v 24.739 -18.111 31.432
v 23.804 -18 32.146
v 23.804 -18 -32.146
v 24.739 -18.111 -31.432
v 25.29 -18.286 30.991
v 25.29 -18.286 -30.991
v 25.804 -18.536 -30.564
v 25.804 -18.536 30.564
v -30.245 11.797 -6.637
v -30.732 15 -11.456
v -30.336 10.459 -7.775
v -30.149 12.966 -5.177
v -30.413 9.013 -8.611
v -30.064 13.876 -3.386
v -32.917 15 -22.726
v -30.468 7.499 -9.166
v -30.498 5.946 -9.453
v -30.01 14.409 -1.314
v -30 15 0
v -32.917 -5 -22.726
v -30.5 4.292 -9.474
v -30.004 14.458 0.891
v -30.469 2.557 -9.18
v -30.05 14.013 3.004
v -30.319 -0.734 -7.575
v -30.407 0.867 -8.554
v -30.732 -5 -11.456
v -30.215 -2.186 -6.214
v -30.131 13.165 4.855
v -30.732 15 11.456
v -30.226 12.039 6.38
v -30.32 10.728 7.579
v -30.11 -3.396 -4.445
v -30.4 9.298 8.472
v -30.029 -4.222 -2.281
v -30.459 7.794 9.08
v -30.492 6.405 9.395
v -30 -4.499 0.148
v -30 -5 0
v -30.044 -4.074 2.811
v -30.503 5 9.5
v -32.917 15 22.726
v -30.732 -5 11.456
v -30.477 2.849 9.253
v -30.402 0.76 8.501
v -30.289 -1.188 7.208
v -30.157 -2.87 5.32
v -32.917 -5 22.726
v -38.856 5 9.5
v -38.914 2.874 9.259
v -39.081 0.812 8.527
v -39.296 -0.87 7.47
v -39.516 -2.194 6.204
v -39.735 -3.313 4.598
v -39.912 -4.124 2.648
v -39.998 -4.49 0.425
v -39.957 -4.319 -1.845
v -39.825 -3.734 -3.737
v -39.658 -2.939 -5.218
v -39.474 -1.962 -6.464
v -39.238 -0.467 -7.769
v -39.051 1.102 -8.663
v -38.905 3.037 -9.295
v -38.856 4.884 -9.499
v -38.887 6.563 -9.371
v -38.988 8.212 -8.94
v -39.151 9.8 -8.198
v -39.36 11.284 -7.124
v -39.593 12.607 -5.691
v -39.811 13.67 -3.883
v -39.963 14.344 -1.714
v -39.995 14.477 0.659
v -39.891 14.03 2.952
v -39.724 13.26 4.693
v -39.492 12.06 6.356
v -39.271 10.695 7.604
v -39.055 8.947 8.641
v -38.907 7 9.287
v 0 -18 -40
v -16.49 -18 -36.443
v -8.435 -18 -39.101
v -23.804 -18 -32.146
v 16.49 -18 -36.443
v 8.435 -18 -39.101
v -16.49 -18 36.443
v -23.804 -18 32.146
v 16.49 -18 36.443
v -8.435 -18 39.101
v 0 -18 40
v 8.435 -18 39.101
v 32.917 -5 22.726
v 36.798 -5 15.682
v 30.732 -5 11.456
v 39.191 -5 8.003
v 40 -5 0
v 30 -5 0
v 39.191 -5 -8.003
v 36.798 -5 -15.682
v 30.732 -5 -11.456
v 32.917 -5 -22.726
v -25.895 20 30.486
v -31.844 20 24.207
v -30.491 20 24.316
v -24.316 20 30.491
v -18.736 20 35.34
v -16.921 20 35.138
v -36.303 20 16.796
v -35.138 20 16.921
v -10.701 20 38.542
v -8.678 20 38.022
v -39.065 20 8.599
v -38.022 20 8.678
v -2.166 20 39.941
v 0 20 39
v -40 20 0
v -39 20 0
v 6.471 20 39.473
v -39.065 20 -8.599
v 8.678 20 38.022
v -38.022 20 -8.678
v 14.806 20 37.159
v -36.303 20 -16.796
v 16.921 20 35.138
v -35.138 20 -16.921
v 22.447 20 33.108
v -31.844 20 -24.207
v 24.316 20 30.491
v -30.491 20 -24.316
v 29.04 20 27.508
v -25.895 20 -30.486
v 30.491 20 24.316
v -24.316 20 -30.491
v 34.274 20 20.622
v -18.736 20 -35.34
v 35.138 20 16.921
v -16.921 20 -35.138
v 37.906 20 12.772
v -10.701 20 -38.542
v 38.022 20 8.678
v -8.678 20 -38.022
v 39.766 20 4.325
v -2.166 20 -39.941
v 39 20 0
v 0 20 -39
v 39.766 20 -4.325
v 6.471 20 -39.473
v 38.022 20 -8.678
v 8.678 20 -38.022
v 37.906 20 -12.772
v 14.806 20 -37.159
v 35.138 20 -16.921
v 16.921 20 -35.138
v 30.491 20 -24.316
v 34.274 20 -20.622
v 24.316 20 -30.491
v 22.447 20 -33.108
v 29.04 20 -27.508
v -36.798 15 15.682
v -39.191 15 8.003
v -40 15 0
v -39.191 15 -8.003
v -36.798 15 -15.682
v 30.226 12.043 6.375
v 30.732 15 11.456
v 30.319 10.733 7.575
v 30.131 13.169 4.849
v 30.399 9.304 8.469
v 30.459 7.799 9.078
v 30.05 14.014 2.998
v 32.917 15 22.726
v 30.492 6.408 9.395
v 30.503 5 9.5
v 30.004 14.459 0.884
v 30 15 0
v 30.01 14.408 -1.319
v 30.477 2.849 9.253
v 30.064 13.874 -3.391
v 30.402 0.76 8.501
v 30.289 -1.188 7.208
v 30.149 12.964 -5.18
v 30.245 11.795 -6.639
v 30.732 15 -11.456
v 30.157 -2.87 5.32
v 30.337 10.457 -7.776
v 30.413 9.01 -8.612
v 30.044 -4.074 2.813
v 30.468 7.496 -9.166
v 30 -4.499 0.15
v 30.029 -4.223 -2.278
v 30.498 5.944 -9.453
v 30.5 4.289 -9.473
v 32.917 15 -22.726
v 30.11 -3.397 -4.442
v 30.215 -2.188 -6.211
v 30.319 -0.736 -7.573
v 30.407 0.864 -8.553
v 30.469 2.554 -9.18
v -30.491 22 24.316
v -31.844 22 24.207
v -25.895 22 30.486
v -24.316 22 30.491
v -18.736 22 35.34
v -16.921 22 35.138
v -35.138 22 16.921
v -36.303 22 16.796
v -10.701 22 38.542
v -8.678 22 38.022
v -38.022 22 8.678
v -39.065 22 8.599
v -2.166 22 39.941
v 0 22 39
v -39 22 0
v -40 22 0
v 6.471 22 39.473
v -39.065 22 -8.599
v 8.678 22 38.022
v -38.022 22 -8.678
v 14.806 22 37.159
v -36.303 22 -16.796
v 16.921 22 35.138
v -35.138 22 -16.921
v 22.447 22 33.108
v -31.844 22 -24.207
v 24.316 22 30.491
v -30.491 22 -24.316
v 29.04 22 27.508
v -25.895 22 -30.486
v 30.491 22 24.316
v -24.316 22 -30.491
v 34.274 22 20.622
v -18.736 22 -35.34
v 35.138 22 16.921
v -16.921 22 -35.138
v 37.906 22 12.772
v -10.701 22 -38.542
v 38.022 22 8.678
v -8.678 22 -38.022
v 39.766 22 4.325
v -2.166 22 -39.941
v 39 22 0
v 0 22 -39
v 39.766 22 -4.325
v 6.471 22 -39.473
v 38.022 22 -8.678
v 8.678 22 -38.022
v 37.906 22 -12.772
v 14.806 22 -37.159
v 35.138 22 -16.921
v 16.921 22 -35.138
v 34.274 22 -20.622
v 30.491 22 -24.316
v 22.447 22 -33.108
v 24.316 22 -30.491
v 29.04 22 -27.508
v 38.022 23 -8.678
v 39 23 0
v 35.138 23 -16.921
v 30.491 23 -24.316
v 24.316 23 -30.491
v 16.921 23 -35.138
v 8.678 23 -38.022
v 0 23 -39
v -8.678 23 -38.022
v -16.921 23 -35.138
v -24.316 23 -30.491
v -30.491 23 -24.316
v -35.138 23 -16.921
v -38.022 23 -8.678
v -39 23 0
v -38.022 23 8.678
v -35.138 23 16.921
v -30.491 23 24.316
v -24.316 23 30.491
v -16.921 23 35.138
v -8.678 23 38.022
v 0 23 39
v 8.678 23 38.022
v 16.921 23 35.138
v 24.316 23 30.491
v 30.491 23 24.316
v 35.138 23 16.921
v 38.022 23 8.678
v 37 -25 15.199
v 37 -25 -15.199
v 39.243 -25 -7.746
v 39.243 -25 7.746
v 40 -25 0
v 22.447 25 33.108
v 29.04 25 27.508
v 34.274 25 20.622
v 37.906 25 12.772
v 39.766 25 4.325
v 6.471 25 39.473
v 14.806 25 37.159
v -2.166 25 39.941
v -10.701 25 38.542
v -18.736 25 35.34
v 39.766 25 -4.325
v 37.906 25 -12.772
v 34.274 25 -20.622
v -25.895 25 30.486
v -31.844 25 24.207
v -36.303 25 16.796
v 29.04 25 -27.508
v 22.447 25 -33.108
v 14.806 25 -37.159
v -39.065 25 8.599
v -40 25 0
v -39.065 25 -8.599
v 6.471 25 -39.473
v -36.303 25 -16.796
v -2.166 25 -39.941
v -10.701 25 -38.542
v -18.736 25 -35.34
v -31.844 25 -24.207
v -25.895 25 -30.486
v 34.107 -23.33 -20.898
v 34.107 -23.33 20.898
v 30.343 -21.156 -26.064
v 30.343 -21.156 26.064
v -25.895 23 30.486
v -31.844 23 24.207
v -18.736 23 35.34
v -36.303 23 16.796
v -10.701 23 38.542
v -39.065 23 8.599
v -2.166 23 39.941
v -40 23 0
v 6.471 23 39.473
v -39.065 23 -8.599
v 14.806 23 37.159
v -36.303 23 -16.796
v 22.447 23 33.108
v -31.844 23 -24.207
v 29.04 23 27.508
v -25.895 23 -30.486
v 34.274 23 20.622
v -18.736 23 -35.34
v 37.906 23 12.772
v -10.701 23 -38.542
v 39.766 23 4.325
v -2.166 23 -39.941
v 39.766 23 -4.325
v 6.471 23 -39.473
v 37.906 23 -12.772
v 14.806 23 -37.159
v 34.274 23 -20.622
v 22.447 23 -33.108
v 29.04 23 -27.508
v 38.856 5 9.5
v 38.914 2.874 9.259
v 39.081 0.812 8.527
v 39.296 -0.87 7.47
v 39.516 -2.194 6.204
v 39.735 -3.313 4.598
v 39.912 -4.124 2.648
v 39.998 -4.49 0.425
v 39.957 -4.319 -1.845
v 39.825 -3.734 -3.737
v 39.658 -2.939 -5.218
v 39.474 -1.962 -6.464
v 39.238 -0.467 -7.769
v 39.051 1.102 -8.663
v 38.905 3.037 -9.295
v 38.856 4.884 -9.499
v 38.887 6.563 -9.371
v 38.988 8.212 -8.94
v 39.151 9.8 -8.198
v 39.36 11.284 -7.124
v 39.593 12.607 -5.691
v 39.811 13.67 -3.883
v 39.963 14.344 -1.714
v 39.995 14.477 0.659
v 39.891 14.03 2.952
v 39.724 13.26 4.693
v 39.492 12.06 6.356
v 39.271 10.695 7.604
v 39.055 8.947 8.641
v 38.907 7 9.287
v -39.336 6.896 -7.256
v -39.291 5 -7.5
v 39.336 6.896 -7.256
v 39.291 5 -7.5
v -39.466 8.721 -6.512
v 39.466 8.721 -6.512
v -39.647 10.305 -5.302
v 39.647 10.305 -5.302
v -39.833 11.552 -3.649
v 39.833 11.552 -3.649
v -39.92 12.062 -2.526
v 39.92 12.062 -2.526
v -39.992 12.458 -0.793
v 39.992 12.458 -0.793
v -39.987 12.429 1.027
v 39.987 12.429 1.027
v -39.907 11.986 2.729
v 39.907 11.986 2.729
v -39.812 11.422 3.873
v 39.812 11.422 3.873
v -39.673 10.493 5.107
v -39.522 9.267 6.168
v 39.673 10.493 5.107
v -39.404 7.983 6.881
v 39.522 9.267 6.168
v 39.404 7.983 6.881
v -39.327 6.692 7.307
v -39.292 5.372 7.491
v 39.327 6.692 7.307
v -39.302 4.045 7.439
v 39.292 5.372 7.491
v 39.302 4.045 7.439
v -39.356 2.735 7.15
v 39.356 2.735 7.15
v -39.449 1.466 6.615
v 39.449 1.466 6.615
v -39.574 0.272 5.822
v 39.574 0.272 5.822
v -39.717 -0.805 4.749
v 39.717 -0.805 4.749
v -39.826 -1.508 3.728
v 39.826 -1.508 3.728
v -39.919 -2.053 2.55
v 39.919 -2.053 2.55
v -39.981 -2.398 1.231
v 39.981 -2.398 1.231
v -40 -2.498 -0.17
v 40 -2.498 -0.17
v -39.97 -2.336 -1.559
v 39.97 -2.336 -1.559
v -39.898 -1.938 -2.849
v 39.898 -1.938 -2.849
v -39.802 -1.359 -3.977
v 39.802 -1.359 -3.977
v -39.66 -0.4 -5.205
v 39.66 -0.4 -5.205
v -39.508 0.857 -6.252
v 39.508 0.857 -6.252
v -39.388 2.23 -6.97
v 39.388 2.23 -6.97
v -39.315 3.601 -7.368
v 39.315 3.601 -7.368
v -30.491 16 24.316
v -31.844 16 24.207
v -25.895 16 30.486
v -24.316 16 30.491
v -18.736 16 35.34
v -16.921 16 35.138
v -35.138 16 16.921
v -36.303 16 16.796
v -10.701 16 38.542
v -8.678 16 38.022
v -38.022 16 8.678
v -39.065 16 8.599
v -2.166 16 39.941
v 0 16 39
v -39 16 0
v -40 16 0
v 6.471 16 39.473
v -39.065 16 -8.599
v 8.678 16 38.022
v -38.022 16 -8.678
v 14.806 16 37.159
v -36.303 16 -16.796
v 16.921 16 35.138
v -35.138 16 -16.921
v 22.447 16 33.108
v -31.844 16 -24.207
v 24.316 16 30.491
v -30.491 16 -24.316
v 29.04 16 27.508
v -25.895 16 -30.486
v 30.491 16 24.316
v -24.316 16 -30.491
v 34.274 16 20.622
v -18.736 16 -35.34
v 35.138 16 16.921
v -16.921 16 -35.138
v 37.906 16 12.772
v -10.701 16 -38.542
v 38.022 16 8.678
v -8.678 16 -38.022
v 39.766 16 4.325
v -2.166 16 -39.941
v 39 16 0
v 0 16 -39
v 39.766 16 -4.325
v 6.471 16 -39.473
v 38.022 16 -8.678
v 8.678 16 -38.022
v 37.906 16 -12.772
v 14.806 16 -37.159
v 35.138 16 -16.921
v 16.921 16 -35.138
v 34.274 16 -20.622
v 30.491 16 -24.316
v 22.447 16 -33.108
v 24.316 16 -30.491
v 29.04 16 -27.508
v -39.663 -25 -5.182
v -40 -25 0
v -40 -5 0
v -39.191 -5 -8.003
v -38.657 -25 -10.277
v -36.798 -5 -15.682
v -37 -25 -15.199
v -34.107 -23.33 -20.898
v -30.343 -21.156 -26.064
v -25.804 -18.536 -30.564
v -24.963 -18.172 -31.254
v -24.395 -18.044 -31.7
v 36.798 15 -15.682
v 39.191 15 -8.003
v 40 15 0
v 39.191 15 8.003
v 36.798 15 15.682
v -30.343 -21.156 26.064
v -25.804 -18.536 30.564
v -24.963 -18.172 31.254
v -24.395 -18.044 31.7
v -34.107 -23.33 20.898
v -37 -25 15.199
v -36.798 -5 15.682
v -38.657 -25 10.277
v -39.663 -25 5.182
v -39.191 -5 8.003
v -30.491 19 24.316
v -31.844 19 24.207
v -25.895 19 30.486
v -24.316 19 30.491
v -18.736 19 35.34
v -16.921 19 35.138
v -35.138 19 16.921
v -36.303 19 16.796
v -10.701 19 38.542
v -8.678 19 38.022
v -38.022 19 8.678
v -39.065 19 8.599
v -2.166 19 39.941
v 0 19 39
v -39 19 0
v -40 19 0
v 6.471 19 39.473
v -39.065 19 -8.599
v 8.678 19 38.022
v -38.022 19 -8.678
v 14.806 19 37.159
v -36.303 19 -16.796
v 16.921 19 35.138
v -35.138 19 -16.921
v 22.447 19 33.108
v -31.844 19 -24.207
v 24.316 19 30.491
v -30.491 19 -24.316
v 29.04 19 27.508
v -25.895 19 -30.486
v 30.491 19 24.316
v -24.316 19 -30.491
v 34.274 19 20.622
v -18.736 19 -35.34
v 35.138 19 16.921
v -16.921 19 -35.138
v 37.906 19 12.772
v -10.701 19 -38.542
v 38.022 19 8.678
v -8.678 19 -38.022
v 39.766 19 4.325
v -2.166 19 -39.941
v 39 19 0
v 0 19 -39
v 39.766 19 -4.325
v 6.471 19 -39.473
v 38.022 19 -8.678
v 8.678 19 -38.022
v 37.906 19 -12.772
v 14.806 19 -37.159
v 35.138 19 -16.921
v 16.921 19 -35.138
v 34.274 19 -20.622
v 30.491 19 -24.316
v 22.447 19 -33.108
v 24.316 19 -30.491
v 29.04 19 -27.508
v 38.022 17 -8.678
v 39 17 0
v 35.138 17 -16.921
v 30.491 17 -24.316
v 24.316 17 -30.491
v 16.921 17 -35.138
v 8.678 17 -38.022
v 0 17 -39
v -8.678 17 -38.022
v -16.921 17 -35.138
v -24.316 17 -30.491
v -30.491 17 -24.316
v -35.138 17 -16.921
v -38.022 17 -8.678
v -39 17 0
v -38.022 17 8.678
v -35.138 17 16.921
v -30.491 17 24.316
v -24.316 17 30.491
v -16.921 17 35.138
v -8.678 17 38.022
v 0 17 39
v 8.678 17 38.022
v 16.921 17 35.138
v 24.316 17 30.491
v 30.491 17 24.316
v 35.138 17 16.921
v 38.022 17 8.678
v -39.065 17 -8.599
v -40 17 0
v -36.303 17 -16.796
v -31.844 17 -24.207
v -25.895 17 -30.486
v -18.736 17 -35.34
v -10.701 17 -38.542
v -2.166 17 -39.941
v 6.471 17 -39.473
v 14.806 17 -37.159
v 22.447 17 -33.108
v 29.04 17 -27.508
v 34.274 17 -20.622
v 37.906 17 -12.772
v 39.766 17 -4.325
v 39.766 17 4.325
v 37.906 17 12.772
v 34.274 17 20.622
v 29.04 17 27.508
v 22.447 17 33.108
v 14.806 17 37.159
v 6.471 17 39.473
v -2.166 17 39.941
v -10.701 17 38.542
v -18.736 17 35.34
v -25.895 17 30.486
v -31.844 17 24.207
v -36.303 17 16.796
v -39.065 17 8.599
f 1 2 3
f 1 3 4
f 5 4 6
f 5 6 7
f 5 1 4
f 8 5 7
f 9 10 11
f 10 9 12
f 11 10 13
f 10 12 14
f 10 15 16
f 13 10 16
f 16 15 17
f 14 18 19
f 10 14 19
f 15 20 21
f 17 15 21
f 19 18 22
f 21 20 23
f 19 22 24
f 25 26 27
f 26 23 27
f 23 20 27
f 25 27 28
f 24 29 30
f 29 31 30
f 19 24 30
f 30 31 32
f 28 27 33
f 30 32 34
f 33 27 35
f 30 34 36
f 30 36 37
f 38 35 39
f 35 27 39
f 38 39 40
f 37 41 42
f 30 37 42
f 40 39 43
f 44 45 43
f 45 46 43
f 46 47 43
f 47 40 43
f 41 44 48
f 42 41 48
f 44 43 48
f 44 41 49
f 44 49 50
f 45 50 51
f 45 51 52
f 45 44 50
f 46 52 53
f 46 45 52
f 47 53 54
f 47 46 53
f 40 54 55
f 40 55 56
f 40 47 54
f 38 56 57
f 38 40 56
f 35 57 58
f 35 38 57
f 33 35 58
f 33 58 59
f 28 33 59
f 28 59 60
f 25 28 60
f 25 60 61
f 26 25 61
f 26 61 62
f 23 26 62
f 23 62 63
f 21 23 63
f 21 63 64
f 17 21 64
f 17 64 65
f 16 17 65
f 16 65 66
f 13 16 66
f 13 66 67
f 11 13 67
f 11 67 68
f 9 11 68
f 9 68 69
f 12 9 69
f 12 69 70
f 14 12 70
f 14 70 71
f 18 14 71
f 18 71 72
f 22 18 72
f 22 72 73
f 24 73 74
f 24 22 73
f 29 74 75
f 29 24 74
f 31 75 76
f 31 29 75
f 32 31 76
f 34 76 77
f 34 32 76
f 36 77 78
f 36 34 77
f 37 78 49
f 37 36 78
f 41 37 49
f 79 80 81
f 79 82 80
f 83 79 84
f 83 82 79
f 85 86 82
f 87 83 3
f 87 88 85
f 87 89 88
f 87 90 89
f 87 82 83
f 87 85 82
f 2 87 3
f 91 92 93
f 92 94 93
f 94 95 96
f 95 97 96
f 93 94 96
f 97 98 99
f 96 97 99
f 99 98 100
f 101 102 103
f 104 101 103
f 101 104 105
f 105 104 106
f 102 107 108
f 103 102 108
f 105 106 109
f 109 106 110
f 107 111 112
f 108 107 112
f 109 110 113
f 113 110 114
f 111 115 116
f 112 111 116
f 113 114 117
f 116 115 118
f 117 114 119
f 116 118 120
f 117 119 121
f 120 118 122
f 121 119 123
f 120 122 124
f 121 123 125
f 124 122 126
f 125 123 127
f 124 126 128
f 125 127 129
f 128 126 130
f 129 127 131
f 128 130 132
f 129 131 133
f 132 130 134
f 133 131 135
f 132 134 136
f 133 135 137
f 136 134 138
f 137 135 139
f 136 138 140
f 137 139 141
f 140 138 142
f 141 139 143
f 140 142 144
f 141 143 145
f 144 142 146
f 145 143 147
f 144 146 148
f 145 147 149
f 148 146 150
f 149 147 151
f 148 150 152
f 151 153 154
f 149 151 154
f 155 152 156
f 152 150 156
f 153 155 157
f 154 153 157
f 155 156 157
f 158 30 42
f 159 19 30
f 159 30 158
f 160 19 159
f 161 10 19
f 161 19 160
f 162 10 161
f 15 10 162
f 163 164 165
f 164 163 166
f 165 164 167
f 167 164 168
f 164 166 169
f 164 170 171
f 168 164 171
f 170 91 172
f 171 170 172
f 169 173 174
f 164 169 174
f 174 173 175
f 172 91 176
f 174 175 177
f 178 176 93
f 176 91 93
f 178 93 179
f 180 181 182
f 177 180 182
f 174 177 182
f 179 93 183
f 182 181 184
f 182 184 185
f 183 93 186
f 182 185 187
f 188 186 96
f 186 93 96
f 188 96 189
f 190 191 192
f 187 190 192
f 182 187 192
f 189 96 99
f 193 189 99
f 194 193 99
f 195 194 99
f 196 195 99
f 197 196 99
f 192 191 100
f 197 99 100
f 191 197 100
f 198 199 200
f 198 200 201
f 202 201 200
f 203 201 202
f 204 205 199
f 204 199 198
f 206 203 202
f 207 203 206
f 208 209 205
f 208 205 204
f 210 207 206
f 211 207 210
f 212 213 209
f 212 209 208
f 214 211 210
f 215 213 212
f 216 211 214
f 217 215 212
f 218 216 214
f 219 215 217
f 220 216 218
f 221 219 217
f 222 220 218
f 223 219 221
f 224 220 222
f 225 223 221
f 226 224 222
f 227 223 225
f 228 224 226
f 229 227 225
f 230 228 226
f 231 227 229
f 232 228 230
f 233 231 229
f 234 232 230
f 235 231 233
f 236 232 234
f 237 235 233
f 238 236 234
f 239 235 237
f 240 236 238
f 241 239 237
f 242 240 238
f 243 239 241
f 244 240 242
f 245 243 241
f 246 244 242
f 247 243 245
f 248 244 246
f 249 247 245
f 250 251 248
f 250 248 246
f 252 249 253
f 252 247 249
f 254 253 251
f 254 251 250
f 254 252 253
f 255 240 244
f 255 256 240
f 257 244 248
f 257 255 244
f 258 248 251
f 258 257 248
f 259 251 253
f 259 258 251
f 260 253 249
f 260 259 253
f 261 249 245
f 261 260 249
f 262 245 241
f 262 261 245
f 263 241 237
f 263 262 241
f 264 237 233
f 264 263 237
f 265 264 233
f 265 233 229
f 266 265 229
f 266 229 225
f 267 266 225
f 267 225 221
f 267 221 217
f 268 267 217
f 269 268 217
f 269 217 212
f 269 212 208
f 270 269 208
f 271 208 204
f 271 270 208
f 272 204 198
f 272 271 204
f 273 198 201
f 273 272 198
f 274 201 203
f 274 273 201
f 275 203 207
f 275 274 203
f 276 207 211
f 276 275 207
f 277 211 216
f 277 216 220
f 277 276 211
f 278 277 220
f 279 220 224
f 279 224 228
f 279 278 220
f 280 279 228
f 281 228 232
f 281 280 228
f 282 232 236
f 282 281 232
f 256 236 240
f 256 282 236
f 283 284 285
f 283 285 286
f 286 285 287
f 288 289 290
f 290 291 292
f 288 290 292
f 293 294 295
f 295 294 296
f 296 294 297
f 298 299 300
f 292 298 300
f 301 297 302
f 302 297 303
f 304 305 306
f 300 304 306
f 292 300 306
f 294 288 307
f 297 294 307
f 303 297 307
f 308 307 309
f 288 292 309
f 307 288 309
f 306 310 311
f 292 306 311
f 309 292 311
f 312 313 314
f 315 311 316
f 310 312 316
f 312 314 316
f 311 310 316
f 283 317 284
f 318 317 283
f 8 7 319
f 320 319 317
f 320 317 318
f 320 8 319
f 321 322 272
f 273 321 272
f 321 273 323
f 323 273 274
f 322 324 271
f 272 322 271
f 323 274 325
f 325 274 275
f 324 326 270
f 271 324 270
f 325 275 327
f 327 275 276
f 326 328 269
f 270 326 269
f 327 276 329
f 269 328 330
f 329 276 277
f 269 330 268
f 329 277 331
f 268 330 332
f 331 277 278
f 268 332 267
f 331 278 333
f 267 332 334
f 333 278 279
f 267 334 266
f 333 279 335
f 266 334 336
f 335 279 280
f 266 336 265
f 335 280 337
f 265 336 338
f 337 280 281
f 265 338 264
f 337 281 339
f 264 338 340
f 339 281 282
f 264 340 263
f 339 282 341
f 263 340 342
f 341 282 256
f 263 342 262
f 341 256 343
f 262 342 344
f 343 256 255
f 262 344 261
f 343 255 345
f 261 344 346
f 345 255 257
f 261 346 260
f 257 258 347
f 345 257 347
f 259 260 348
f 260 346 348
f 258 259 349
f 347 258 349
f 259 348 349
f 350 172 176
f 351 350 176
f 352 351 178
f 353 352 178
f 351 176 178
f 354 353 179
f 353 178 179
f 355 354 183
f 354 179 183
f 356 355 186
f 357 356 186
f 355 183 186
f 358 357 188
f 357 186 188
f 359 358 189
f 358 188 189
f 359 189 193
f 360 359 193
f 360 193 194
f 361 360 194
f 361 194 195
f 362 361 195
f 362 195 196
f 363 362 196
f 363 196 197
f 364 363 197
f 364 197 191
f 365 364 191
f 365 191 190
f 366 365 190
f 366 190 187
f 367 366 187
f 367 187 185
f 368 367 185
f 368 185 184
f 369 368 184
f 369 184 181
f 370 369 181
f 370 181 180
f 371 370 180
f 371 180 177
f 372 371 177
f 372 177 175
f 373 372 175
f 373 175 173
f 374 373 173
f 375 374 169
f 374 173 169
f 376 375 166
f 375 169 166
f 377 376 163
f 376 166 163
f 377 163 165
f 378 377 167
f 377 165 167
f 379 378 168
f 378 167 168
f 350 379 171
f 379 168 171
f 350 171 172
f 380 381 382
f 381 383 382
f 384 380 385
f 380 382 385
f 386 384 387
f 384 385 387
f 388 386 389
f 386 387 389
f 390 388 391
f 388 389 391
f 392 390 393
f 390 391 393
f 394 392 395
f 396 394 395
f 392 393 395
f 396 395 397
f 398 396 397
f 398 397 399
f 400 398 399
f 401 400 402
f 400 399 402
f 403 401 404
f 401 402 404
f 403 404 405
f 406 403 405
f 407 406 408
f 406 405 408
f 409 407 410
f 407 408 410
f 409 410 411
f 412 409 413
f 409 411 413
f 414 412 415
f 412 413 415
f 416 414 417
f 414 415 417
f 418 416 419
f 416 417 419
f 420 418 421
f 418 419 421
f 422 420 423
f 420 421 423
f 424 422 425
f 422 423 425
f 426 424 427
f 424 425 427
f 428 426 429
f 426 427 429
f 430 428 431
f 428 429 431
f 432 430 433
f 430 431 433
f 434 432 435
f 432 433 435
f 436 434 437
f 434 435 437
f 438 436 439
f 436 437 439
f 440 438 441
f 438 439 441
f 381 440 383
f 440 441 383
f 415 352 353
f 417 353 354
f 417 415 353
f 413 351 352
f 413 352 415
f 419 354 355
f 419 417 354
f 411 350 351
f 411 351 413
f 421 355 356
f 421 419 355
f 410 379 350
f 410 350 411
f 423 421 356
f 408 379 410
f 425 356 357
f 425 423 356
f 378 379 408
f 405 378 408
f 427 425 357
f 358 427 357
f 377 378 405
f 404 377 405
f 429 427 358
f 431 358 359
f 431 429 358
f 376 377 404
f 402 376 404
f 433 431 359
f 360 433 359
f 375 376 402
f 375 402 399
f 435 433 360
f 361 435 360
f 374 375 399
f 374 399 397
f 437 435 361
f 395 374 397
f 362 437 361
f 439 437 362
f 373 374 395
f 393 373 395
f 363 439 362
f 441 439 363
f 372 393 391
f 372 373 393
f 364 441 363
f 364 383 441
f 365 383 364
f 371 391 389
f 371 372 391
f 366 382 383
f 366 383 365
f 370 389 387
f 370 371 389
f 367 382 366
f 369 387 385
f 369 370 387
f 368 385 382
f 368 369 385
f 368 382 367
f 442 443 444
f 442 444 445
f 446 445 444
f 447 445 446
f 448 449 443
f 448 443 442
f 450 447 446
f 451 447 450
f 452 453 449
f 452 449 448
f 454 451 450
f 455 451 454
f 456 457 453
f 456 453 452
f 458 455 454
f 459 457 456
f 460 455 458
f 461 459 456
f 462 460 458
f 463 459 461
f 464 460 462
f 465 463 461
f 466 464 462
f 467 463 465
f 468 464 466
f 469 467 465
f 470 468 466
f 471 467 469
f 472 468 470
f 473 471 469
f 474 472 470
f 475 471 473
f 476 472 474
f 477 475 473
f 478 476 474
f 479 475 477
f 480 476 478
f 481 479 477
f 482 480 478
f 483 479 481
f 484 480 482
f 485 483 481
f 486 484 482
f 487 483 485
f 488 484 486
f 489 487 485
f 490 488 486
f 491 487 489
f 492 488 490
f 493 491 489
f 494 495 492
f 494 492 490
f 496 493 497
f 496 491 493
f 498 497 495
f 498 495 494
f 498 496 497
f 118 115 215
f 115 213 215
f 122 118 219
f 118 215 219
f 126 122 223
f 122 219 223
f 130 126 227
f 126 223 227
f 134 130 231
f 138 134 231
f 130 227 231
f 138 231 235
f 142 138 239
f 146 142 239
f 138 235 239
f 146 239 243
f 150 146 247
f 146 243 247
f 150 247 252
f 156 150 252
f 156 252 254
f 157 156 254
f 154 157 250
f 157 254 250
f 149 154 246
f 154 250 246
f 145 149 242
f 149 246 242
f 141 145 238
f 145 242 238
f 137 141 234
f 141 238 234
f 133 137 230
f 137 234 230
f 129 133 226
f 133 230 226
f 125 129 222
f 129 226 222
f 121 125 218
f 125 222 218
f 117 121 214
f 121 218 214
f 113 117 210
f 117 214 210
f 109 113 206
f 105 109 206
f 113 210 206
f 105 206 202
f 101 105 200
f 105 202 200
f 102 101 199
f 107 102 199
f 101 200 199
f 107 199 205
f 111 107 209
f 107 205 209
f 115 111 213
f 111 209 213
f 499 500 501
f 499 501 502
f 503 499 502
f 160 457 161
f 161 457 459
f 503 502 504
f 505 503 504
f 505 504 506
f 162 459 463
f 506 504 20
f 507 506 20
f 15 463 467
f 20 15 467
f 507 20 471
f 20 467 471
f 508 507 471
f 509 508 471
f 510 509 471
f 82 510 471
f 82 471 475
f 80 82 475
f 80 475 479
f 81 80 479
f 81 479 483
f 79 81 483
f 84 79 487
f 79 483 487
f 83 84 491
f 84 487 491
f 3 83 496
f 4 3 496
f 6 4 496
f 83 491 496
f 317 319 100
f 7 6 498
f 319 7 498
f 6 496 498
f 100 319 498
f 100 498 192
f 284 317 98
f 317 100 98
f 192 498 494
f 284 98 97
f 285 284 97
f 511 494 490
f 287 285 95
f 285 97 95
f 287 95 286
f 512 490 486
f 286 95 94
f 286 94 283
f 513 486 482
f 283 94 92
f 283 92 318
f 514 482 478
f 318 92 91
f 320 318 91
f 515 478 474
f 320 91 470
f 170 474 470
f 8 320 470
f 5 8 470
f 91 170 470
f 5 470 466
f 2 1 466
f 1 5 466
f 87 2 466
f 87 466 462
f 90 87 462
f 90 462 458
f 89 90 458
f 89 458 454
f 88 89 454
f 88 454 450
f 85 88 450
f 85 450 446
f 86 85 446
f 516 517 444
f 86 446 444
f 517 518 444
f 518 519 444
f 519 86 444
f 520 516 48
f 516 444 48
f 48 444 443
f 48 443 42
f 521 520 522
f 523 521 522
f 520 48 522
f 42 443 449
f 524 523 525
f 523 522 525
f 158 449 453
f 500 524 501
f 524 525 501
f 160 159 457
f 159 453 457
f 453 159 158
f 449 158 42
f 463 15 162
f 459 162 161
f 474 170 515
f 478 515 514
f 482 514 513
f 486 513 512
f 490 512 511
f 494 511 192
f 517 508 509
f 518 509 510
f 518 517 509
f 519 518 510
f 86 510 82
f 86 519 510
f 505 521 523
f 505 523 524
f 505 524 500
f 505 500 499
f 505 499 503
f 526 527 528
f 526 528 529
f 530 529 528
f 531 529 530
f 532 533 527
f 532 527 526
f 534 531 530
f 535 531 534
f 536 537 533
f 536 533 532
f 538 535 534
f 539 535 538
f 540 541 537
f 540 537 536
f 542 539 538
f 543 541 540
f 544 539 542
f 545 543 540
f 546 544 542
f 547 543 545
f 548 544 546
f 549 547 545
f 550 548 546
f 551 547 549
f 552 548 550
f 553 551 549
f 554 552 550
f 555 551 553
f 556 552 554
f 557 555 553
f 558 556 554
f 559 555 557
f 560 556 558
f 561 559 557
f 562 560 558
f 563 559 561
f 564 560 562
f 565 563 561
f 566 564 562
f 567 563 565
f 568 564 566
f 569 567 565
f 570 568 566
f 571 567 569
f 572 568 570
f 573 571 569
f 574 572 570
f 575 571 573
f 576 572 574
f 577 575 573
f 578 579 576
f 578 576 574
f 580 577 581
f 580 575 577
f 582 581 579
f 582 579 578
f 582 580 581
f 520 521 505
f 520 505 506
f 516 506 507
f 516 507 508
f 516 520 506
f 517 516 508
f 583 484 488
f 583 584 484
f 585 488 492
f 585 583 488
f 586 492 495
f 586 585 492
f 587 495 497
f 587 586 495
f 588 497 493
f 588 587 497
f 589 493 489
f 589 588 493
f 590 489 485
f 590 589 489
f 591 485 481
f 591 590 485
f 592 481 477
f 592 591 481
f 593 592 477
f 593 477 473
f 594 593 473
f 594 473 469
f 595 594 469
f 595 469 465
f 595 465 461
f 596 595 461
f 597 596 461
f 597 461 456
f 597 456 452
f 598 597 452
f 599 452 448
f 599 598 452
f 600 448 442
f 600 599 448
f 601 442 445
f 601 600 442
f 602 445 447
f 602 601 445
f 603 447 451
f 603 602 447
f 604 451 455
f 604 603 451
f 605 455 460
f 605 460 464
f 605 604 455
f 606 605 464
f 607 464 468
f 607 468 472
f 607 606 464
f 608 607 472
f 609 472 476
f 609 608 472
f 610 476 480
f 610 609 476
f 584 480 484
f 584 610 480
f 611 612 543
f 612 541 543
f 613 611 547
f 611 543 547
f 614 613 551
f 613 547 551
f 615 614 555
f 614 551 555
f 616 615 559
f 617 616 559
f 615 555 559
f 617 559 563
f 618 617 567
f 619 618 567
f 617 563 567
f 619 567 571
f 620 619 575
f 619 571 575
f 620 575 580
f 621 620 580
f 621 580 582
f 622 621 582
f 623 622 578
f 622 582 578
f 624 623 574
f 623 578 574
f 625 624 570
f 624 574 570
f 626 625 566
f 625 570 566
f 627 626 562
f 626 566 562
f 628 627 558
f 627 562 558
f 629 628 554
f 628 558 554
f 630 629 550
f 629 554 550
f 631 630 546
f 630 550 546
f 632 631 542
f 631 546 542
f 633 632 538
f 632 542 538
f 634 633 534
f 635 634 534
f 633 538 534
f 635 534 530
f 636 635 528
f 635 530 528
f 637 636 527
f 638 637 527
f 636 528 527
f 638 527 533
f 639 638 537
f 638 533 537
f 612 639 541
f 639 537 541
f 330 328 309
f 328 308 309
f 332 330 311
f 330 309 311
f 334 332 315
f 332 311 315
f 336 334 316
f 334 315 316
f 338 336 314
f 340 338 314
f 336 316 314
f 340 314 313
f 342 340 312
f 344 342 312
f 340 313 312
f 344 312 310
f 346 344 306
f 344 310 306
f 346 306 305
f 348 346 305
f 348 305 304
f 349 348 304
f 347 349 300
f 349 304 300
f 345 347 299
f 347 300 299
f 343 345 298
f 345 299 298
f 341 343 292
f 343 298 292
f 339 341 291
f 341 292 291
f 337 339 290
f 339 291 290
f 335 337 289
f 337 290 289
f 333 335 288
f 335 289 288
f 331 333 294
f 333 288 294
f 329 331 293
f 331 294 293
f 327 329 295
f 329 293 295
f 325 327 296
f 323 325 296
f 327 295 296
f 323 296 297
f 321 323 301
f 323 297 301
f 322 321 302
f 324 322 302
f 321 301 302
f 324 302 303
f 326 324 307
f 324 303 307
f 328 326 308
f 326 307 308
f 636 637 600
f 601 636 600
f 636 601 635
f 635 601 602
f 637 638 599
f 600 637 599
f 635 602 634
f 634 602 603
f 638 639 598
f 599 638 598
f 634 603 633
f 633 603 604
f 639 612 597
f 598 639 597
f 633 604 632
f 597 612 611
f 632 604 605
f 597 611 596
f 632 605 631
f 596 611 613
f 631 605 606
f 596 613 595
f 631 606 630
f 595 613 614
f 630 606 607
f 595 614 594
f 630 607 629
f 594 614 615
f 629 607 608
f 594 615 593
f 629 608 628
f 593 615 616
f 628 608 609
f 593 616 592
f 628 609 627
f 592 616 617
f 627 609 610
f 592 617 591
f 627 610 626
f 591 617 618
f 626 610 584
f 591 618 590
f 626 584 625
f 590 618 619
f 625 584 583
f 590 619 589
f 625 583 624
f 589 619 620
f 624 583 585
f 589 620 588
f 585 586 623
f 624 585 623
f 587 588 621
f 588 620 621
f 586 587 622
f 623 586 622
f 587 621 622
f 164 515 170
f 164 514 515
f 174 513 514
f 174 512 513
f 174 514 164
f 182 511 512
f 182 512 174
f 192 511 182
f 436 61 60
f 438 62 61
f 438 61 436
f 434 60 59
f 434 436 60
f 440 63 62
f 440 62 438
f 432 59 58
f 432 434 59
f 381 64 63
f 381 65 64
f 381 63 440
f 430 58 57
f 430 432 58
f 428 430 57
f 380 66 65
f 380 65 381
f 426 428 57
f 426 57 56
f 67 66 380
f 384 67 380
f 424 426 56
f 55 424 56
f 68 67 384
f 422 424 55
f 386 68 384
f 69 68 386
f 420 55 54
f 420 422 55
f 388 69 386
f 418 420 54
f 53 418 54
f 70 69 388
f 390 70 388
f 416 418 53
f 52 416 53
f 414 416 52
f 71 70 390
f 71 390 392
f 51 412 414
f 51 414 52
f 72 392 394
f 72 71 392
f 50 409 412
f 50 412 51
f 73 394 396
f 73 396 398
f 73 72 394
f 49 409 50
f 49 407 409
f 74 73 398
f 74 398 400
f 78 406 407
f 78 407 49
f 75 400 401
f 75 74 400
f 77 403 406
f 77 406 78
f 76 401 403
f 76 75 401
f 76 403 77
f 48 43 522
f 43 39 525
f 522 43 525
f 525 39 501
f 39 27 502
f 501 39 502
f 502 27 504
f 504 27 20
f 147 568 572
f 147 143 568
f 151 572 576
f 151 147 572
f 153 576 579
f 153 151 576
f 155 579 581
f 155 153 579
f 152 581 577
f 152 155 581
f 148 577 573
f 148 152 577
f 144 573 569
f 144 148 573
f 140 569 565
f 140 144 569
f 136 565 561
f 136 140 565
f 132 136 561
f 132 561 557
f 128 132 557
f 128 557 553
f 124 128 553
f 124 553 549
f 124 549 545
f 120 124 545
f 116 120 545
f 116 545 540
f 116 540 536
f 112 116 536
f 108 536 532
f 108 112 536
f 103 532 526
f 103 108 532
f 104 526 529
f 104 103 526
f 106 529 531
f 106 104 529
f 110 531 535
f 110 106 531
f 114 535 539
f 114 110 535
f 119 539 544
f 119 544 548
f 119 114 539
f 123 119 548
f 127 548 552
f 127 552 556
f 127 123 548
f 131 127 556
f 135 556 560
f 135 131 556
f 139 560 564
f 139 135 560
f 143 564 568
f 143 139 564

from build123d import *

# Parameters (mm, degrees)
SKETCH1_W                            = 40
SKETCH1_H                            = 50
CUT_EXTRUDE1_DEPTH                   = 55
SKETCH3_R                            = 90
CUT_EXTRUDE4_DEPTH                   = 20
BOSS_EXTRUDE1_REACH                  = 63.847
BOSS_EXTRUDE1_END_RADIUS             = 40
SKETCH4_R                            = 9.5
BOSS_EXTRUDE1_DIRECTION_2_REACH      = 63.847
BOSS_EXTRUDE1_DIRECTION_2_END_RADIUS = 40
SKETCH5_R                            = 7.5
CUT_EXTRUDE5_DEPTH                   = 55
SKETCH6_W                            = 1
SKETCH6_H                            = 1


with BuildPart() as part:
    # Sketch1 → Revolve1 (revolve)
    with BuildSketch(Plane.XY):
        with Locations((-20, 0)):
            Rectangle(SKETCH1_W, SKETCH1_H)
    revolve(axis=Axis((0, 25, 0), (0, -1, 0)))

    # Sketch2 → Cut-Extrude1 (cut, symmetric)
    with BuildSketch(Plane.XY):
        with BuildLine():
            Line((-37, -25), (-25.803847577, -18.535898385))
            ThreePointArc((-25.803847577, -18.535898385), (-24.839123758, -18.136296695), (-23.803847577, -18))
            Line((-23.803847577, -18), (23.803847577, -18))
            ThreePointArc((23.803847577, -18), (24.839123758, -18.136296695), (25.803847577, -18.535898385))
            Line((25.803847577, -18.535898385), (37, -25))
            Line((37, -25), (-37, -25))
        make_face()
    extrude(amount=CUT_EXTRUDE1_DEPTH, both=True, mode=Mode.SUBTRACT)

    # Sketch3 → Cut-Extrude4 (cut)
    with BuildSketch(Plane(origin=(0, -5, 0), x_dir=(-1, 0, 0), z_dir=(0, -1, 0))):
        with Locations((-120, 0)):
            Circle(SKETCH3_R)
        with Locations((120, 0)):
            Circle(SKETCH3_R)
    extrude(amount=-CUT_EXTRUDE4_DEPTH, mode=Mode.SUBTRACT)

    # Boss-Extrude1: up to this cylinder (the profile starts inside it)
    boss_extrude1_end = Plane(origin=(0, 5, 0), z_dir=(0, 1, 0)) * Cylinder(BOSS_EXTRUDE1_END_RADIUS, 208.694, mode=Mode.PRIVATE)
    # Sketch4 → Boss-Extrude1 (add, up to the surface)
    with BuildSketch(Plane(origin=(0, 0, 0), x_dir=(0, 0, -1), z_dir=(1, 0, 0)), mode=Mode.PRIVATE) as boss_extrude1_sk1:
        with Locations(Location((0, 5, 0), (0, 0, 180))):
            Circle(SKETCH4_R)
    boss_extrude1_tool1 = extrude(boss_extrude1_sk1.sketch, amount=BOSS_EXTRUDE1_REACH, mode=Mode.PRIVATE) & boss_extrude1_end
    add(boss_extrude1_tool1.solids().sort_by_distance((0, 5, 0))[0])

    # Boss-Extrude1 direction 2: up to this cylinder (the profile starts inside it)
    boss_extrude1_direction_2_end = Plane(origin=(0, 5, 0), z_dir=(0, 1, 0)) * Cylinder(BOSS_EXTRUDE1_DIRECTION_2_END_RADIUS, 208.694, mode=Mode.PRIVATE)
    # Sketch4 → Boss-Extrude1 direction 2 (add, up to the surface)
    with BuildSketch(Plane(origin=(0, 0, 0), x_dir=(0, 0, -1), z_dir=(1, 0, 0)), mode=Mode.PRIVATE) as boss_extrude1_direction_2_sk1:
        with Locations(Location((0, 5, 0), (0, 0, 180))):
            Circle(SKETCH4_R)
    boss_extrude1_direction_2_tool1 = extrude(boss_extrude1_direction_2_sk1.sketch, amount=-BOSS_EXTRUDE1_DIRECTION_2_REACH, mode=Mode.PRIVATE) & boss_extrude1_direction_2_end
    add(boss_extrude1_direction_2_tool1.solids().sort_by_distance((0, 5, 0))[0])

    # Sketch5 → Cut-Extrude5 (cut, symmetric)
    with BuildSketch(Plane(origin=(0, 0, 0), x_dir=(0, 0, -1), z_dir=(1, 0, 0))):
        with Locations((0, 5)):
            Circle(SKETCH5_R)
    extrude(amount=CUT_EXTRUDE5_DEPTH, both=True, mode=Mode.SUBTRACT)

    # Sketch6 → Cut-Revolve1 (revolve, cut)
    with BuildSketch(Plane.XY, mode=Mode.PRIVATE) as cut_revolve1_sk:
        with Locations((-39.5, 22.5)):
            Rectangle(SKETCH6_W, SKETCH6_H)
        with Locations((-39.5, 19.5)):
            Rectangle(SKETCH6_W, SKETCH6_H)
        with Locations((-39.5, 16.5)):
            Rectangle(SKETCH6_W, SKETCH6_H)
    revolve(cut_revolve1_sk.sketch.rotate(Axis((0, 0, 0), (0, 1, 0)), 180), axis=Axis((0, 0, 0), (0, 1, 0)), mode=Mode.SUBTRACT)


solid = part.part
